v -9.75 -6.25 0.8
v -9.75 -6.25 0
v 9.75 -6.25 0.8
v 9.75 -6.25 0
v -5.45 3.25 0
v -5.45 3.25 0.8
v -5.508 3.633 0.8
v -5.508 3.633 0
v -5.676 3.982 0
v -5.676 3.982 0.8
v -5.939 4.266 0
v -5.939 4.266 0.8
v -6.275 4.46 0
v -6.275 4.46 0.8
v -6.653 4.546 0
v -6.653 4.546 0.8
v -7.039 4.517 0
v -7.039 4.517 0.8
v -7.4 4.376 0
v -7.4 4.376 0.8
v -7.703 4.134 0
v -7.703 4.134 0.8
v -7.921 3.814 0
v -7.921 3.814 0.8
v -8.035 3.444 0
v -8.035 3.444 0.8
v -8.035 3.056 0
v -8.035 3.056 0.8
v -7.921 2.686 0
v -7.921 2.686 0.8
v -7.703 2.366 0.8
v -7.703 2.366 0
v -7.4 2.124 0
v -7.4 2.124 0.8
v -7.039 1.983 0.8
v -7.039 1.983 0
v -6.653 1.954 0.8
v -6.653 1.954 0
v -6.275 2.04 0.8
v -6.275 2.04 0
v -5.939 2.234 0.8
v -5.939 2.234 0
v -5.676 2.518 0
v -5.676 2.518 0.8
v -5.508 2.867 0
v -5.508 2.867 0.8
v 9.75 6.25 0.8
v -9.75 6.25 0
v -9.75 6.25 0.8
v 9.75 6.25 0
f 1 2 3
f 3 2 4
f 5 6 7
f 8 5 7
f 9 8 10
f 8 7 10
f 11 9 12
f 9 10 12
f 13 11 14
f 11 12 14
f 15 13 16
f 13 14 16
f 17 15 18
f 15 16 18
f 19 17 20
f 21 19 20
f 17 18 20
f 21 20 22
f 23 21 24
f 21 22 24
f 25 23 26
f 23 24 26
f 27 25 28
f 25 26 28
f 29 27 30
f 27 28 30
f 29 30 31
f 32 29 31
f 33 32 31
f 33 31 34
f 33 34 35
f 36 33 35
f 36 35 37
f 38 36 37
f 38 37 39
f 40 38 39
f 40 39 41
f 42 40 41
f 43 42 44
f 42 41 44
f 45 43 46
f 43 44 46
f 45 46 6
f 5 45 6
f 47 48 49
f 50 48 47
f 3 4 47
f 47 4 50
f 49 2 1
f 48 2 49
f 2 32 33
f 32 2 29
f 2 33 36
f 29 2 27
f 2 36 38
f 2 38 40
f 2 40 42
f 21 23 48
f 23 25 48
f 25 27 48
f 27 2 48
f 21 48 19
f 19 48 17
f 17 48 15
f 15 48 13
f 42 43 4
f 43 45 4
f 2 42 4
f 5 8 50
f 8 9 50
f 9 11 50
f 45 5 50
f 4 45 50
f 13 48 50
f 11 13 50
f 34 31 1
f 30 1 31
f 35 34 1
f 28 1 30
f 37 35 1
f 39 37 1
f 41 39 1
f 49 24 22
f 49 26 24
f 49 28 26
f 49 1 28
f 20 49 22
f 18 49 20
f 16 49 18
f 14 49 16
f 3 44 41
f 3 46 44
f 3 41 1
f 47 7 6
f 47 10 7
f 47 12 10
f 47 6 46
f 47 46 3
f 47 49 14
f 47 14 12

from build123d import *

# Parameters (mm, degrees)
ESQUISSE1_W             = 19.5
ESQUISSE1_H             = 12.5
BOSS_EXTRU_1_DEPTH      = 0.8
ESQUISSE2_R             = 1.3
ENL_V_MAT_EXTRU_1_DEPTH = 0.8


with BuildPart() as part:
    # Esquisse1 → Boss.-Extru.1 (new body)
    with BuildSketch(Plane.XY):
        Rectangle(ESQUISSE1_W, ESQUISSE1_H)
    extrude(amount=BOSS_EXTRU_1_DEPTH)

    # Esquisse2 → Enlèv. mat.-Extru.1 (cut)
    with BuildSketch(Plane.XY.offset(0.8)):
        with Locations((-6.75, 3.25)):
            Circle(ESQUISSE2_R)
    extrude(amount=-ENL_V_MAT_EXTRU_1_DEPTH, mode=Mode.SUBTRACT)


solid = part.part
